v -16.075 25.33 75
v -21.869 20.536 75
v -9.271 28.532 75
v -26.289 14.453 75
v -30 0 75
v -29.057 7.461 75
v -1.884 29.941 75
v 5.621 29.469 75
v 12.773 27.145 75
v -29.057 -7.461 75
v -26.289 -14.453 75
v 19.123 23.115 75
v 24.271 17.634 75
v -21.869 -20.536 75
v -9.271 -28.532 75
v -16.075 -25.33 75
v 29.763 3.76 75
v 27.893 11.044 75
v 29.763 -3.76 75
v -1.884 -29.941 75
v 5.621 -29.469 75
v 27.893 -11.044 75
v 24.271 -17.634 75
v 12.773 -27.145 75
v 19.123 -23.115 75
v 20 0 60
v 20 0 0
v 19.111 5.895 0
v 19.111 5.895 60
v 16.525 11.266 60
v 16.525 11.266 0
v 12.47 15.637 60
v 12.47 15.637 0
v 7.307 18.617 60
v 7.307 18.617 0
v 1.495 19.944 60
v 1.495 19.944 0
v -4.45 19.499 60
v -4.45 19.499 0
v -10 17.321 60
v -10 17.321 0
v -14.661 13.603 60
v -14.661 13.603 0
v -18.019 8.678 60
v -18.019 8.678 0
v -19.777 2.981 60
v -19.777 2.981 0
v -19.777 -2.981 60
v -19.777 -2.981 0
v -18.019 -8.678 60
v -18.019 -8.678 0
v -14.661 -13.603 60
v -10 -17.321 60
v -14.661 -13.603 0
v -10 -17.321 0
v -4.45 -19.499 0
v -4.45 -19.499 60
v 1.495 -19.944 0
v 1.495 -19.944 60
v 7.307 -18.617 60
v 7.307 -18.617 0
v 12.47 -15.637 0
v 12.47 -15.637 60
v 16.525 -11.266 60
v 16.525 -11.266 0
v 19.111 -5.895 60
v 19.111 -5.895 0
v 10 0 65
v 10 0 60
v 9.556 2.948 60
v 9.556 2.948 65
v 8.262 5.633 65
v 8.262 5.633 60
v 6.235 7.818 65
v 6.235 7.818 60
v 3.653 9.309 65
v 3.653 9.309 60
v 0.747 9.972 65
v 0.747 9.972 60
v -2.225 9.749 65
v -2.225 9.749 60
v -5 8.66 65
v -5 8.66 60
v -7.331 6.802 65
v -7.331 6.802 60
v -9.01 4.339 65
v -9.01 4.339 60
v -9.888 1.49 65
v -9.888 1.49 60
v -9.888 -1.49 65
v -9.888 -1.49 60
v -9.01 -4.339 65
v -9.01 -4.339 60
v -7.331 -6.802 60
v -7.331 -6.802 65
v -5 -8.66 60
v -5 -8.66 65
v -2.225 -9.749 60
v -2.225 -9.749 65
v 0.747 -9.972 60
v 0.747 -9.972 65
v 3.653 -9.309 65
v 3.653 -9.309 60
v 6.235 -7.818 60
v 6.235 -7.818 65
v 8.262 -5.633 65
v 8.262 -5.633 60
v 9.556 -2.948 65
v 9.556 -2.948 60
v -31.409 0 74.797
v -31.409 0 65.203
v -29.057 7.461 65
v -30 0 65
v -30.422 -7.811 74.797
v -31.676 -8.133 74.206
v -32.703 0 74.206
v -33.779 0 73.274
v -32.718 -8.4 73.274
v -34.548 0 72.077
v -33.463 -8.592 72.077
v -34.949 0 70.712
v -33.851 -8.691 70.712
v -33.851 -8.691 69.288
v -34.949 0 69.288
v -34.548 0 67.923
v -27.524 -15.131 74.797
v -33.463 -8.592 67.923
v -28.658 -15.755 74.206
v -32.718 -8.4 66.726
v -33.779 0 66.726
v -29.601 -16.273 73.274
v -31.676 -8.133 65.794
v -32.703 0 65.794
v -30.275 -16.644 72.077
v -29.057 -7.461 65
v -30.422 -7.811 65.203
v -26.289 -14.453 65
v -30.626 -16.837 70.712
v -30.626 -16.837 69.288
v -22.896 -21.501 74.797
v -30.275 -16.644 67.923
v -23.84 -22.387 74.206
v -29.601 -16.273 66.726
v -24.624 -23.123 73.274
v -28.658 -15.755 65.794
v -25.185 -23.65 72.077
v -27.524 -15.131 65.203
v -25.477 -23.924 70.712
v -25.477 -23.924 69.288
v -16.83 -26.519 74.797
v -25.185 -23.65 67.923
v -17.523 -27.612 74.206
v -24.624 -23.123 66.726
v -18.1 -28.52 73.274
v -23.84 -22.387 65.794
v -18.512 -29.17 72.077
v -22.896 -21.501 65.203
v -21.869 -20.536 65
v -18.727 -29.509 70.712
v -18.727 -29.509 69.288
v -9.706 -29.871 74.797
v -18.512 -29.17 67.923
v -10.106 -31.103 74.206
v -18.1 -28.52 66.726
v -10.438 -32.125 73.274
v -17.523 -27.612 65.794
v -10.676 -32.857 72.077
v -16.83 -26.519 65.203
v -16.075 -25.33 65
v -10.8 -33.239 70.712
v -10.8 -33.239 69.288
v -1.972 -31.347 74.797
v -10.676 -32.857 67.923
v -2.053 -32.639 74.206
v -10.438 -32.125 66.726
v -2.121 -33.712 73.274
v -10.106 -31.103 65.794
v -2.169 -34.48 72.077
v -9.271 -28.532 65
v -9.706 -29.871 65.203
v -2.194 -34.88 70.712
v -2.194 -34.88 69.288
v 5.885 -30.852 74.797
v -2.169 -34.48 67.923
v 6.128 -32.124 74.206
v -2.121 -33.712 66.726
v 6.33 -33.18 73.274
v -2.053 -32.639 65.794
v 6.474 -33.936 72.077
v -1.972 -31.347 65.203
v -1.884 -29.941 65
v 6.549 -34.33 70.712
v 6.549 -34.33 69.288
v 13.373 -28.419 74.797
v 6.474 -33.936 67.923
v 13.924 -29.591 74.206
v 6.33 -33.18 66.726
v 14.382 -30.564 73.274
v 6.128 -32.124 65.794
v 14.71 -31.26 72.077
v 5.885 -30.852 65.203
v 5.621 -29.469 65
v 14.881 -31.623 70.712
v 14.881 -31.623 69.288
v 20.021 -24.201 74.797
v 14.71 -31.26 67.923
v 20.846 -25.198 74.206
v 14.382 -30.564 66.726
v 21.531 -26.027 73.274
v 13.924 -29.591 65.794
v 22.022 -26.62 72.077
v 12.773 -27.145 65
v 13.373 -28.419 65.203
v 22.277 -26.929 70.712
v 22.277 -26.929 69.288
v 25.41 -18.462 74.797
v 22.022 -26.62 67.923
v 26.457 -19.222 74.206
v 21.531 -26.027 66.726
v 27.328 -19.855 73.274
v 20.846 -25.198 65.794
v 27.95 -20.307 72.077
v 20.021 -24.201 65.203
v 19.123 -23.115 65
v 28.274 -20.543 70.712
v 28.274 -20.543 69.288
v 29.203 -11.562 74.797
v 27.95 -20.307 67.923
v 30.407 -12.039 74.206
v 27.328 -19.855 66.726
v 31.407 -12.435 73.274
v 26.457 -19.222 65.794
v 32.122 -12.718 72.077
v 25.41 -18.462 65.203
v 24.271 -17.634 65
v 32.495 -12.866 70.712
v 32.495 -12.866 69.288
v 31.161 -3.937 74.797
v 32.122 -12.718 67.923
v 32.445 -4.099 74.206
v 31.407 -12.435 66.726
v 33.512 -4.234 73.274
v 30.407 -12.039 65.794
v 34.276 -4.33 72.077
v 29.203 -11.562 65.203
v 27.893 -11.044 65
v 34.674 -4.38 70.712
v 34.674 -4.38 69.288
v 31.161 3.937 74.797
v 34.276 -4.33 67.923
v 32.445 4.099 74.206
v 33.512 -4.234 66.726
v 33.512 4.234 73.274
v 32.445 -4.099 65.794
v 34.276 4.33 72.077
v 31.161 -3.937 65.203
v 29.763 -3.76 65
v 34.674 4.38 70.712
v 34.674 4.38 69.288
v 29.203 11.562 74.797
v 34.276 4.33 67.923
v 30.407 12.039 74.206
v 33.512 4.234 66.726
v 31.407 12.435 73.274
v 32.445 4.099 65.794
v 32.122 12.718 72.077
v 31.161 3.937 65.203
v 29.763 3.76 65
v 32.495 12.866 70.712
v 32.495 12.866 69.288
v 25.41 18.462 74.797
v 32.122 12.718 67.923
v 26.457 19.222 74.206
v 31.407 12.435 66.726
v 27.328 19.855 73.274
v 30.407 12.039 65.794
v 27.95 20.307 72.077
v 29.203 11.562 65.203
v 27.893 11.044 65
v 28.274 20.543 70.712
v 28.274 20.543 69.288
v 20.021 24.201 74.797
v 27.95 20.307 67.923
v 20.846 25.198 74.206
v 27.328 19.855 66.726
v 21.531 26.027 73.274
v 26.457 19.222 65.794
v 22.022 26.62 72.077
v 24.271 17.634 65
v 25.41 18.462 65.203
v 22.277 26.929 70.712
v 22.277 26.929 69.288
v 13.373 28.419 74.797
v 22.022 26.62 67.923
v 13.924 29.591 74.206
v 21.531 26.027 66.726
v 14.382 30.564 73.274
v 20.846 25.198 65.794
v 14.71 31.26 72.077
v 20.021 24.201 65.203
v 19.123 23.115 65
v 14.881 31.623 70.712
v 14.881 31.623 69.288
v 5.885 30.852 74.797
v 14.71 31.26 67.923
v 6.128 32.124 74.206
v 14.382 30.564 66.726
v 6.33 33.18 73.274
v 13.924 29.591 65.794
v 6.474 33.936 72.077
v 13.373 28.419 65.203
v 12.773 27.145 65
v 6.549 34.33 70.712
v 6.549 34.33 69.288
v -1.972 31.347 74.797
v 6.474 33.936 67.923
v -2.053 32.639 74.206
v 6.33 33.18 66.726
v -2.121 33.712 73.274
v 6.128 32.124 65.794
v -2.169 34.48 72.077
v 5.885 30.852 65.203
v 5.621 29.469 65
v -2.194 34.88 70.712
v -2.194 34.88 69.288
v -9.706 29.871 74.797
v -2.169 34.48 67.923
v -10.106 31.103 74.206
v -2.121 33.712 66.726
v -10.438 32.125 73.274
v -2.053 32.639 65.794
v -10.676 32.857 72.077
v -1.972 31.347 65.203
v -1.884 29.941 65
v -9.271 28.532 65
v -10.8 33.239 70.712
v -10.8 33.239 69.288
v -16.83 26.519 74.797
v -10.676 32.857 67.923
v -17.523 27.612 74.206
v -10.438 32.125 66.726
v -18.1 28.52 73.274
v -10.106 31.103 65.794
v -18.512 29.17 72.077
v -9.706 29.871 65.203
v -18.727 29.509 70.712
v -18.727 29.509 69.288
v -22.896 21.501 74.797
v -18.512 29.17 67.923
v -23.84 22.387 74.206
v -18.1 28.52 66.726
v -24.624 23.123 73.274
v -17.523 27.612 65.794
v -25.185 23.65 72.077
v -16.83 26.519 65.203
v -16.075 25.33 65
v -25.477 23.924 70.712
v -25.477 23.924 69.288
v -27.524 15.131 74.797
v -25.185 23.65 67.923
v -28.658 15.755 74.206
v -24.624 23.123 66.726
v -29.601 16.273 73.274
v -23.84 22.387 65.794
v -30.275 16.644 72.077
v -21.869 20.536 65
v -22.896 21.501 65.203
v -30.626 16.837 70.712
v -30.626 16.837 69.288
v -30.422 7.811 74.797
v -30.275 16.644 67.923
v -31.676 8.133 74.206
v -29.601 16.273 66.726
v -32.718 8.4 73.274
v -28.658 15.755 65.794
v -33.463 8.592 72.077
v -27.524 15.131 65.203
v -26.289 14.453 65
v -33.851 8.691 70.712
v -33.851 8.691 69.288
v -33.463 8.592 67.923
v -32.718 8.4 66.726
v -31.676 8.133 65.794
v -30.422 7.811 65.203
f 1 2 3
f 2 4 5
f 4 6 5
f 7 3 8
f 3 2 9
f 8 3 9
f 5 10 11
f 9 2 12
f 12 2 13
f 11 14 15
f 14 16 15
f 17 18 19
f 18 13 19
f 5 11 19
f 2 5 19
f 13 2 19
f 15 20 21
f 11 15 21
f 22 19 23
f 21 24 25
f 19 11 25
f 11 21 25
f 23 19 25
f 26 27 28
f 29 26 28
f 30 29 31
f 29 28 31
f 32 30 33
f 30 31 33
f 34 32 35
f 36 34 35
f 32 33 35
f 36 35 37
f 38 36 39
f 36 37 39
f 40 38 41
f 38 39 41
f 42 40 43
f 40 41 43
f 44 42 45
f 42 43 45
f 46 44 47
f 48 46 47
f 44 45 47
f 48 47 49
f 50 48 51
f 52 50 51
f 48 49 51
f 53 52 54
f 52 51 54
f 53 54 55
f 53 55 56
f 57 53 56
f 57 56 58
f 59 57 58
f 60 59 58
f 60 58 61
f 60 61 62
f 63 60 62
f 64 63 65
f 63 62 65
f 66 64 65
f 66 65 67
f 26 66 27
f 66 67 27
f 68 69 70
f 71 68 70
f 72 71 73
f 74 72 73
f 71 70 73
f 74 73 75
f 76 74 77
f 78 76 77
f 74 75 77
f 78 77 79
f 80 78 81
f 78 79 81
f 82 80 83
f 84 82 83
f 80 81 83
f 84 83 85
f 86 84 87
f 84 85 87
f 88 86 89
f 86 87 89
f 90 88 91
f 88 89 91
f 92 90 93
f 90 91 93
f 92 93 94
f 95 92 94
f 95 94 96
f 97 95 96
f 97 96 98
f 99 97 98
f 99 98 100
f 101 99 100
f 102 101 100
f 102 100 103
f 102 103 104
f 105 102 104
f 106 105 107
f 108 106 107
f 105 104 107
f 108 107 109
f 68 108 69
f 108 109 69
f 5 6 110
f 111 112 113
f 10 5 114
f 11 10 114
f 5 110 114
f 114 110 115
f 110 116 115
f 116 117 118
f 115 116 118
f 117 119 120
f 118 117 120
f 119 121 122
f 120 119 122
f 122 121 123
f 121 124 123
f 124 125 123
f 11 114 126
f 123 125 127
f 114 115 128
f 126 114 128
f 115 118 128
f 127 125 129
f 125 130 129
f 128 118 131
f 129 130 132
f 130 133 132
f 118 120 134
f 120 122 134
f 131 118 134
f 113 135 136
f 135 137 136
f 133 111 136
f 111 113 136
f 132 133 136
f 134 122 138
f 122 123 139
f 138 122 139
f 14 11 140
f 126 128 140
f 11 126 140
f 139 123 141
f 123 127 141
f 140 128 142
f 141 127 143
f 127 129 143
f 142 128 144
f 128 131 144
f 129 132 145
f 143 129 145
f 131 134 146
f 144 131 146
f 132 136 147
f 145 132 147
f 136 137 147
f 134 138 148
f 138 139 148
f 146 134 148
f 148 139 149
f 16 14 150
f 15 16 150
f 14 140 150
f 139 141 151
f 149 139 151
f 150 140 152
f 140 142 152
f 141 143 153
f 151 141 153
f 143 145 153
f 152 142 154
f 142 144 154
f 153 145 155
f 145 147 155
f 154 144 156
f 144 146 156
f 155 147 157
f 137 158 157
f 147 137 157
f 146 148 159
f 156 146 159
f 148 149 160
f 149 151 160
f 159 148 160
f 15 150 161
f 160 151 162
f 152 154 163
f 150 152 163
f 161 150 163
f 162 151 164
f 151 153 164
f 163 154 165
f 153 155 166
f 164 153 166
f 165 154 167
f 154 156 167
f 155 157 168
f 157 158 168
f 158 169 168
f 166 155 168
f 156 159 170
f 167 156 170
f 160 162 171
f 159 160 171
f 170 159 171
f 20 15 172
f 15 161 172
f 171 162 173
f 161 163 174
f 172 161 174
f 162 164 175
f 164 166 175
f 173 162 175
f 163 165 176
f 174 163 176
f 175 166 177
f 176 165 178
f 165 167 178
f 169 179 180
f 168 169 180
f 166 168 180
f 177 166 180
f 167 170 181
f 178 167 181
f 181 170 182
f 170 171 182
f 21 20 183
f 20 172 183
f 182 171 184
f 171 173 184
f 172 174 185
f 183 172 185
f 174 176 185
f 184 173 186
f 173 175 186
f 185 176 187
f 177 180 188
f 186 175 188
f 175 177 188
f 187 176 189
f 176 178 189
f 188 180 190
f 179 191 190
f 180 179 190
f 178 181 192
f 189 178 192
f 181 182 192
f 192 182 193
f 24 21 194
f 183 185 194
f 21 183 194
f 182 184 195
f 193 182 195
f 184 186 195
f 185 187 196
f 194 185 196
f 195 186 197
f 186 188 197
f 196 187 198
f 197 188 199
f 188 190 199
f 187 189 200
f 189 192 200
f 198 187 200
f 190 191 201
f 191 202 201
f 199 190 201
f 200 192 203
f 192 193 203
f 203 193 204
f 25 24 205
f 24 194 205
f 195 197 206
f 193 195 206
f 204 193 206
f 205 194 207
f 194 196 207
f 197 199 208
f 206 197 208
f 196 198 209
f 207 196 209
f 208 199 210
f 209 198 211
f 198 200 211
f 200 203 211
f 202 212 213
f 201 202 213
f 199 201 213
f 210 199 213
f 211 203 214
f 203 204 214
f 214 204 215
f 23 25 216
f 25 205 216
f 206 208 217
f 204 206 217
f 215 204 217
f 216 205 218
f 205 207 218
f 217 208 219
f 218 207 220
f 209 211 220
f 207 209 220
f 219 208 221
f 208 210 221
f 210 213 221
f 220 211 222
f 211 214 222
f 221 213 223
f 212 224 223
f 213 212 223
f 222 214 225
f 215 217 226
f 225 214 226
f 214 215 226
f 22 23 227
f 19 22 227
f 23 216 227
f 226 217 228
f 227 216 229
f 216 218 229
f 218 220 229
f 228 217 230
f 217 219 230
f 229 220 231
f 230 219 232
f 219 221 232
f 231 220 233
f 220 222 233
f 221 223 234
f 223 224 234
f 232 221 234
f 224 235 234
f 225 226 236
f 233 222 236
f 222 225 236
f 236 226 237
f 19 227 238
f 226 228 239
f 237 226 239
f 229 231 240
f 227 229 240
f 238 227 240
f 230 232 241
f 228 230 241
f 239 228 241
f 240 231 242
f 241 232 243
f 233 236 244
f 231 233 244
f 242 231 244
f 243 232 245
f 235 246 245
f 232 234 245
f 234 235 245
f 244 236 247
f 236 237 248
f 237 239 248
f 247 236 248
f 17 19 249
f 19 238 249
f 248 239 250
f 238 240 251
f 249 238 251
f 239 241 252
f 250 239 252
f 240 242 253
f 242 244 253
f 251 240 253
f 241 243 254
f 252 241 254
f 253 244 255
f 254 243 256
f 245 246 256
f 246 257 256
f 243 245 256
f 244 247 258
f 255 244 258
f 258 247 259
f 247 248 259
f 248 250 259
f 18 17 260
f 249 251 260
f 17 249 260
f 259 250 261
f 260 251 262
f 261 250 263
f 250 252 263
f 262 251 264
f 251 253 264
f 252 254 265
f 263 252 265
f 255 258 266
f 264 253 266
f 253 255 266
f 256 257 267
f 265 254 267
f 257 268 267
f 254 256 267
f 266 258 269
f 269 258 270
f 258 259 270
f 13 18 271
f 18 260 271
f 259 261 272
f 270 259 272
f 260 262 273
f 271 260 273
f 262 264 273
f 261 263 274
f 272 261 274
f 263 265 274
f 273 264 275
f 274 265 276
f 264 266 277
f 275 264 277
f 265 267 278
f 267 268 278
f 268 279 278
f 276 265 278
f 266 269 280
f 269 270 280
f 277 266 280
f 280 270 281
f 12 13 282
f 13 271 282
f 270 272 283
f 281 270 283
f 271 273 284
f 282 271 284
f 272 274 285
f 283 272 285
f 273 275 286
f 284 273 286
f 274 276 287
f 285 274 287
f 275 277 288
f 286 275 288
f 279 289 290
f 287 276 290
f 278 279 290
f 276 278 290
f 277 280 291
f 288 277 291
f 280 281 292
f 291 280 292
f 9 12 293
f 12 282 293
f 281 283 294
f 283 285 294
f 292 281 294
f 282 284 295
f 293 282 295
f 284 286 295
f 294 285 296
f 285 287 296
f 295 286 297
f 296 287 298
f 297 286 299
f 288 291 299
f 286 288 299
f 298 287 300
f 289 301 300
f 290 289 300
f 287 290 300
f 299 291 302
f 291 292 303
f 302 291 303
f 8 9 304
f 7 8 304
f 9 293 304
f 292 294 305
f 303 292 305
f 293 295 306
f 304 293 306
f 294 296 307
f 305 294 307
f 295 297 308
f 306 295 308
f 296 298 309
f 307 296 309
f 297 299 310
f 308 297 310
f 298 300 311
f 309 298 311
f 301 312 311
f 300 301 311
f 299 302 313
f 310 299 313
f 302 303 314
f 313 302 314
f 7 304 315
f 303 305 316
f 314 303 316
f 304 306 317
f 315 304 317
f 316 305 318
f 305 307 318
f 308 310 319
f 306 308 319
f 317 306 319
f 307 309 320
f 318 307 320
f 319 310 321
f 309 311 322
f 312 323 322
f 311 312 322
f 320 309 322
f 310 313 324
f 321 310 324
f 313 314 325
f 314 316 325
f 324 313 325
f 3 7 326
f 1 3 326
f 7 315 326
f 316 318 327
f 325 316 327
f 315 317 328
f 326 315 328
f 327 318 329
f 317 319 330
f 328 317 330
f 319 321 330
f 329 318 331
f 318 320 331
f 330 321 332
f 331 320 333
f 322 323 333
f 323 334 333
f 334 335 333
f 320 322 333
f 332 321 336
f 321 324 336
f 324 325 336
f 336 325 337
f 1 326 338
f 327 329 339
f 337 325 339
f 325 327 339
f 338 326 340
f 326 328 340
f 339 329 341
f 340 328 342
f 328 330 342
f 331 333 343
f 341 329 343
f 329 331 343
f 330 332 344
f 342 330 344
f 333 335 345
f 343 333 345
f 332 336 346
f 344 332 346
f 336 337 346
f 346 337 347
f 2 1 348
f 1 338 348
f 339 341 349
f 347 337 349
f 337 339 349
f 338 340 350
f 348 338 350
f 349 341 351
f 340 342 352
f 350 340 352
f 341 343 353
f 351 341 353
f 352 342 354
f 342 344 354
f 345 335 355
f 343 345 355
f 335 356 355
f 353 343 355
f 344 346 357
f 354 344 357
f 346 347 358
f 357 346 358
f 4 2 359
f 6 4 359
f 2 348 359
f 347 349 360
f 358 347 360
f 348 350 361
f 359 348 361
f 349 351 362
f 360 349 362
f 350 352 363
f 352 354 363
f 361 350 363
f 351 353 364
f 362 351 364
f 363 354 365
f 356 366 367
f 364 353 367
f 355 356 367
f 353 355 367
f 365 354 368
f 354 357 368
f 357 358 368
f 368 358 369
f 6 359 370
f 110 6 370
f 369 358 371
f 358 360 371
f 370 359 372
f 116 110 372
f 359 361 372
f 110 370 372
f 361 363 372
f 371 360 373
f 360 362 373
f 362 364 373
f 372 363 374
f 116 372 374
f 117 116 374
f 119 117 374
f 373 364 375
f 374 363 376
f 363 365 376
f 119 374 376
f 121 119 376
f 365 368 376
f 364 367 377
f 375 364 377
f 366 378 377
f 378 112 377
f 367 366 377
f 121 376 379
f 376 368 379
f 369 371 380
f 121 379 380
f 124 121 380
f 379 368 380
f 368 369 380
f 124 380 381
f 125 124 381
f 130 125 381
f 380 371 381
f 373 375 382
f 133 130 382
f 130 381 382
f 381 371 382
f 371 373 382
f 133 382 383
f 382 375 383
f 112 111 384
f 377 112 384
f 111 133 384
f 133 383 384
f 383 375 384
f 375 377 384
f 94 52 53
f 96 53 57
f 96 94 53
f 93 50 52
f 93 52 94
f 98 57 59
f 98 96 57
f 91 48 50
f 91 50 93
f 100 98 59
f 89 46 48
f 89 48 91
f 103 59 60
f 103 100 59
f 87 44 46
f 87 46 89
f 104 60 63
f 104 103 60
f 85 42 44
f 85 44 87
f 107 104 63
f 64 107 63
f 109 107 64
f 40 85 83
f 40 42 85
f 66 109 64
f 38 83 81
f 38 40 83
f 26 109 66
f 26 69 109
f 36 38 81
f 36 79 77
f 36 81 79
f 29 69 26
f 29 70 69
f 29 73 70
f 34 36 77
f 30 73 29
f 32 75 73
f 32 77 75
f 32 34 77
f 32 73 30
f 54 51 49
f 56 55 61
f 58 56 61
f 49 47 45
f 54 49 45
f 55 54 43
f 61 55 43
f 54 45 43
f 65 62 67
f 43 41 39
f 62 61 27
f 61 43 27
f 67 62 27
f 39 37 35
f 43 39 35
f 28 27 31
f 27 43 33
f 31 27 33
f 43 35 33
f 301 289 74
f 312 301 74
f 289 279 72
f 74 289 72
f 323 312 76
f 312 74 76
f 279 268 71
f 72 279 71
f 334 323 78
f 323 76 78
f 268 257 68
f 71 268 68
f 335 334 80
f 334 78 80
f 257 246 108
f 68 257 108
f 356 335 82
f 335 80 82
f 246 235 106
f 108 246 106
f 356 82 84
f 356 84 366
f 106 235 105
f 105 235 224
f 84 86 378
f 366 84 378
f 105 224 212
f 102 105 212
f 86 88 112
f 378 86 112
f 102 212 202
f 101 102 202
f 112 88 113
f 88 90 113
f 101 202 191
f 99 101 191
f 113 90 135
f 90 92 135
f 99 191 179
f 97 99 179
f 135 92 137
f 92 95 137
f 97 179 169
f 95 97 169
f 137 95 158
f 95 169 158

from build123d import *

# Parameters (mm, degrees)
SKETCH_1_R      = 20
EXTRUDE_1_DEPTH = 60
SKETCH_2_R      = 10
EXTRUDE_2_DEPTH = 5


with BuildPart() as part:
    # 草图1 → 凸台-拉伸1 (new body)
    with BuildSketch(Plane.XY):
        Circle(SKETCH_1_R)
    extrude(amount=EXTRUDE_1_DEPTH)

    # 草图2 → 凸台-拉伸2 (add)
    with BuildSketch(Plane.XY.offset(60)):
        Circle(SKETCH_2_R)
    extrude(amount=EXTRUDE_2_DEPTH)

    # 草图3 → 旋转1 (revolve)
    with BuildSketch(Plane(origin=(0, 0, 0), x_dir=(0, 0, -1), z_dir=(1, 0, 0)), mode=Mode.PRIVATE) as revolve_1_sk:
        with BuildLine():
            Line((-65, 0), (-75, 0))
            Line((-75, 0), (-75, 30))
            ThreePointArc((-75, 30), (-70, 35), (-65, 30))
            Line((-65, 30), (-65, 0))
        make_face()
    revolve(revolve_1_sk.sketch.rotate(Axis((0, 0, 65), (0, 0, 1)), 90), axis=Axis((0, 0, 65), (0, 0, 1)))


solid = part.part
